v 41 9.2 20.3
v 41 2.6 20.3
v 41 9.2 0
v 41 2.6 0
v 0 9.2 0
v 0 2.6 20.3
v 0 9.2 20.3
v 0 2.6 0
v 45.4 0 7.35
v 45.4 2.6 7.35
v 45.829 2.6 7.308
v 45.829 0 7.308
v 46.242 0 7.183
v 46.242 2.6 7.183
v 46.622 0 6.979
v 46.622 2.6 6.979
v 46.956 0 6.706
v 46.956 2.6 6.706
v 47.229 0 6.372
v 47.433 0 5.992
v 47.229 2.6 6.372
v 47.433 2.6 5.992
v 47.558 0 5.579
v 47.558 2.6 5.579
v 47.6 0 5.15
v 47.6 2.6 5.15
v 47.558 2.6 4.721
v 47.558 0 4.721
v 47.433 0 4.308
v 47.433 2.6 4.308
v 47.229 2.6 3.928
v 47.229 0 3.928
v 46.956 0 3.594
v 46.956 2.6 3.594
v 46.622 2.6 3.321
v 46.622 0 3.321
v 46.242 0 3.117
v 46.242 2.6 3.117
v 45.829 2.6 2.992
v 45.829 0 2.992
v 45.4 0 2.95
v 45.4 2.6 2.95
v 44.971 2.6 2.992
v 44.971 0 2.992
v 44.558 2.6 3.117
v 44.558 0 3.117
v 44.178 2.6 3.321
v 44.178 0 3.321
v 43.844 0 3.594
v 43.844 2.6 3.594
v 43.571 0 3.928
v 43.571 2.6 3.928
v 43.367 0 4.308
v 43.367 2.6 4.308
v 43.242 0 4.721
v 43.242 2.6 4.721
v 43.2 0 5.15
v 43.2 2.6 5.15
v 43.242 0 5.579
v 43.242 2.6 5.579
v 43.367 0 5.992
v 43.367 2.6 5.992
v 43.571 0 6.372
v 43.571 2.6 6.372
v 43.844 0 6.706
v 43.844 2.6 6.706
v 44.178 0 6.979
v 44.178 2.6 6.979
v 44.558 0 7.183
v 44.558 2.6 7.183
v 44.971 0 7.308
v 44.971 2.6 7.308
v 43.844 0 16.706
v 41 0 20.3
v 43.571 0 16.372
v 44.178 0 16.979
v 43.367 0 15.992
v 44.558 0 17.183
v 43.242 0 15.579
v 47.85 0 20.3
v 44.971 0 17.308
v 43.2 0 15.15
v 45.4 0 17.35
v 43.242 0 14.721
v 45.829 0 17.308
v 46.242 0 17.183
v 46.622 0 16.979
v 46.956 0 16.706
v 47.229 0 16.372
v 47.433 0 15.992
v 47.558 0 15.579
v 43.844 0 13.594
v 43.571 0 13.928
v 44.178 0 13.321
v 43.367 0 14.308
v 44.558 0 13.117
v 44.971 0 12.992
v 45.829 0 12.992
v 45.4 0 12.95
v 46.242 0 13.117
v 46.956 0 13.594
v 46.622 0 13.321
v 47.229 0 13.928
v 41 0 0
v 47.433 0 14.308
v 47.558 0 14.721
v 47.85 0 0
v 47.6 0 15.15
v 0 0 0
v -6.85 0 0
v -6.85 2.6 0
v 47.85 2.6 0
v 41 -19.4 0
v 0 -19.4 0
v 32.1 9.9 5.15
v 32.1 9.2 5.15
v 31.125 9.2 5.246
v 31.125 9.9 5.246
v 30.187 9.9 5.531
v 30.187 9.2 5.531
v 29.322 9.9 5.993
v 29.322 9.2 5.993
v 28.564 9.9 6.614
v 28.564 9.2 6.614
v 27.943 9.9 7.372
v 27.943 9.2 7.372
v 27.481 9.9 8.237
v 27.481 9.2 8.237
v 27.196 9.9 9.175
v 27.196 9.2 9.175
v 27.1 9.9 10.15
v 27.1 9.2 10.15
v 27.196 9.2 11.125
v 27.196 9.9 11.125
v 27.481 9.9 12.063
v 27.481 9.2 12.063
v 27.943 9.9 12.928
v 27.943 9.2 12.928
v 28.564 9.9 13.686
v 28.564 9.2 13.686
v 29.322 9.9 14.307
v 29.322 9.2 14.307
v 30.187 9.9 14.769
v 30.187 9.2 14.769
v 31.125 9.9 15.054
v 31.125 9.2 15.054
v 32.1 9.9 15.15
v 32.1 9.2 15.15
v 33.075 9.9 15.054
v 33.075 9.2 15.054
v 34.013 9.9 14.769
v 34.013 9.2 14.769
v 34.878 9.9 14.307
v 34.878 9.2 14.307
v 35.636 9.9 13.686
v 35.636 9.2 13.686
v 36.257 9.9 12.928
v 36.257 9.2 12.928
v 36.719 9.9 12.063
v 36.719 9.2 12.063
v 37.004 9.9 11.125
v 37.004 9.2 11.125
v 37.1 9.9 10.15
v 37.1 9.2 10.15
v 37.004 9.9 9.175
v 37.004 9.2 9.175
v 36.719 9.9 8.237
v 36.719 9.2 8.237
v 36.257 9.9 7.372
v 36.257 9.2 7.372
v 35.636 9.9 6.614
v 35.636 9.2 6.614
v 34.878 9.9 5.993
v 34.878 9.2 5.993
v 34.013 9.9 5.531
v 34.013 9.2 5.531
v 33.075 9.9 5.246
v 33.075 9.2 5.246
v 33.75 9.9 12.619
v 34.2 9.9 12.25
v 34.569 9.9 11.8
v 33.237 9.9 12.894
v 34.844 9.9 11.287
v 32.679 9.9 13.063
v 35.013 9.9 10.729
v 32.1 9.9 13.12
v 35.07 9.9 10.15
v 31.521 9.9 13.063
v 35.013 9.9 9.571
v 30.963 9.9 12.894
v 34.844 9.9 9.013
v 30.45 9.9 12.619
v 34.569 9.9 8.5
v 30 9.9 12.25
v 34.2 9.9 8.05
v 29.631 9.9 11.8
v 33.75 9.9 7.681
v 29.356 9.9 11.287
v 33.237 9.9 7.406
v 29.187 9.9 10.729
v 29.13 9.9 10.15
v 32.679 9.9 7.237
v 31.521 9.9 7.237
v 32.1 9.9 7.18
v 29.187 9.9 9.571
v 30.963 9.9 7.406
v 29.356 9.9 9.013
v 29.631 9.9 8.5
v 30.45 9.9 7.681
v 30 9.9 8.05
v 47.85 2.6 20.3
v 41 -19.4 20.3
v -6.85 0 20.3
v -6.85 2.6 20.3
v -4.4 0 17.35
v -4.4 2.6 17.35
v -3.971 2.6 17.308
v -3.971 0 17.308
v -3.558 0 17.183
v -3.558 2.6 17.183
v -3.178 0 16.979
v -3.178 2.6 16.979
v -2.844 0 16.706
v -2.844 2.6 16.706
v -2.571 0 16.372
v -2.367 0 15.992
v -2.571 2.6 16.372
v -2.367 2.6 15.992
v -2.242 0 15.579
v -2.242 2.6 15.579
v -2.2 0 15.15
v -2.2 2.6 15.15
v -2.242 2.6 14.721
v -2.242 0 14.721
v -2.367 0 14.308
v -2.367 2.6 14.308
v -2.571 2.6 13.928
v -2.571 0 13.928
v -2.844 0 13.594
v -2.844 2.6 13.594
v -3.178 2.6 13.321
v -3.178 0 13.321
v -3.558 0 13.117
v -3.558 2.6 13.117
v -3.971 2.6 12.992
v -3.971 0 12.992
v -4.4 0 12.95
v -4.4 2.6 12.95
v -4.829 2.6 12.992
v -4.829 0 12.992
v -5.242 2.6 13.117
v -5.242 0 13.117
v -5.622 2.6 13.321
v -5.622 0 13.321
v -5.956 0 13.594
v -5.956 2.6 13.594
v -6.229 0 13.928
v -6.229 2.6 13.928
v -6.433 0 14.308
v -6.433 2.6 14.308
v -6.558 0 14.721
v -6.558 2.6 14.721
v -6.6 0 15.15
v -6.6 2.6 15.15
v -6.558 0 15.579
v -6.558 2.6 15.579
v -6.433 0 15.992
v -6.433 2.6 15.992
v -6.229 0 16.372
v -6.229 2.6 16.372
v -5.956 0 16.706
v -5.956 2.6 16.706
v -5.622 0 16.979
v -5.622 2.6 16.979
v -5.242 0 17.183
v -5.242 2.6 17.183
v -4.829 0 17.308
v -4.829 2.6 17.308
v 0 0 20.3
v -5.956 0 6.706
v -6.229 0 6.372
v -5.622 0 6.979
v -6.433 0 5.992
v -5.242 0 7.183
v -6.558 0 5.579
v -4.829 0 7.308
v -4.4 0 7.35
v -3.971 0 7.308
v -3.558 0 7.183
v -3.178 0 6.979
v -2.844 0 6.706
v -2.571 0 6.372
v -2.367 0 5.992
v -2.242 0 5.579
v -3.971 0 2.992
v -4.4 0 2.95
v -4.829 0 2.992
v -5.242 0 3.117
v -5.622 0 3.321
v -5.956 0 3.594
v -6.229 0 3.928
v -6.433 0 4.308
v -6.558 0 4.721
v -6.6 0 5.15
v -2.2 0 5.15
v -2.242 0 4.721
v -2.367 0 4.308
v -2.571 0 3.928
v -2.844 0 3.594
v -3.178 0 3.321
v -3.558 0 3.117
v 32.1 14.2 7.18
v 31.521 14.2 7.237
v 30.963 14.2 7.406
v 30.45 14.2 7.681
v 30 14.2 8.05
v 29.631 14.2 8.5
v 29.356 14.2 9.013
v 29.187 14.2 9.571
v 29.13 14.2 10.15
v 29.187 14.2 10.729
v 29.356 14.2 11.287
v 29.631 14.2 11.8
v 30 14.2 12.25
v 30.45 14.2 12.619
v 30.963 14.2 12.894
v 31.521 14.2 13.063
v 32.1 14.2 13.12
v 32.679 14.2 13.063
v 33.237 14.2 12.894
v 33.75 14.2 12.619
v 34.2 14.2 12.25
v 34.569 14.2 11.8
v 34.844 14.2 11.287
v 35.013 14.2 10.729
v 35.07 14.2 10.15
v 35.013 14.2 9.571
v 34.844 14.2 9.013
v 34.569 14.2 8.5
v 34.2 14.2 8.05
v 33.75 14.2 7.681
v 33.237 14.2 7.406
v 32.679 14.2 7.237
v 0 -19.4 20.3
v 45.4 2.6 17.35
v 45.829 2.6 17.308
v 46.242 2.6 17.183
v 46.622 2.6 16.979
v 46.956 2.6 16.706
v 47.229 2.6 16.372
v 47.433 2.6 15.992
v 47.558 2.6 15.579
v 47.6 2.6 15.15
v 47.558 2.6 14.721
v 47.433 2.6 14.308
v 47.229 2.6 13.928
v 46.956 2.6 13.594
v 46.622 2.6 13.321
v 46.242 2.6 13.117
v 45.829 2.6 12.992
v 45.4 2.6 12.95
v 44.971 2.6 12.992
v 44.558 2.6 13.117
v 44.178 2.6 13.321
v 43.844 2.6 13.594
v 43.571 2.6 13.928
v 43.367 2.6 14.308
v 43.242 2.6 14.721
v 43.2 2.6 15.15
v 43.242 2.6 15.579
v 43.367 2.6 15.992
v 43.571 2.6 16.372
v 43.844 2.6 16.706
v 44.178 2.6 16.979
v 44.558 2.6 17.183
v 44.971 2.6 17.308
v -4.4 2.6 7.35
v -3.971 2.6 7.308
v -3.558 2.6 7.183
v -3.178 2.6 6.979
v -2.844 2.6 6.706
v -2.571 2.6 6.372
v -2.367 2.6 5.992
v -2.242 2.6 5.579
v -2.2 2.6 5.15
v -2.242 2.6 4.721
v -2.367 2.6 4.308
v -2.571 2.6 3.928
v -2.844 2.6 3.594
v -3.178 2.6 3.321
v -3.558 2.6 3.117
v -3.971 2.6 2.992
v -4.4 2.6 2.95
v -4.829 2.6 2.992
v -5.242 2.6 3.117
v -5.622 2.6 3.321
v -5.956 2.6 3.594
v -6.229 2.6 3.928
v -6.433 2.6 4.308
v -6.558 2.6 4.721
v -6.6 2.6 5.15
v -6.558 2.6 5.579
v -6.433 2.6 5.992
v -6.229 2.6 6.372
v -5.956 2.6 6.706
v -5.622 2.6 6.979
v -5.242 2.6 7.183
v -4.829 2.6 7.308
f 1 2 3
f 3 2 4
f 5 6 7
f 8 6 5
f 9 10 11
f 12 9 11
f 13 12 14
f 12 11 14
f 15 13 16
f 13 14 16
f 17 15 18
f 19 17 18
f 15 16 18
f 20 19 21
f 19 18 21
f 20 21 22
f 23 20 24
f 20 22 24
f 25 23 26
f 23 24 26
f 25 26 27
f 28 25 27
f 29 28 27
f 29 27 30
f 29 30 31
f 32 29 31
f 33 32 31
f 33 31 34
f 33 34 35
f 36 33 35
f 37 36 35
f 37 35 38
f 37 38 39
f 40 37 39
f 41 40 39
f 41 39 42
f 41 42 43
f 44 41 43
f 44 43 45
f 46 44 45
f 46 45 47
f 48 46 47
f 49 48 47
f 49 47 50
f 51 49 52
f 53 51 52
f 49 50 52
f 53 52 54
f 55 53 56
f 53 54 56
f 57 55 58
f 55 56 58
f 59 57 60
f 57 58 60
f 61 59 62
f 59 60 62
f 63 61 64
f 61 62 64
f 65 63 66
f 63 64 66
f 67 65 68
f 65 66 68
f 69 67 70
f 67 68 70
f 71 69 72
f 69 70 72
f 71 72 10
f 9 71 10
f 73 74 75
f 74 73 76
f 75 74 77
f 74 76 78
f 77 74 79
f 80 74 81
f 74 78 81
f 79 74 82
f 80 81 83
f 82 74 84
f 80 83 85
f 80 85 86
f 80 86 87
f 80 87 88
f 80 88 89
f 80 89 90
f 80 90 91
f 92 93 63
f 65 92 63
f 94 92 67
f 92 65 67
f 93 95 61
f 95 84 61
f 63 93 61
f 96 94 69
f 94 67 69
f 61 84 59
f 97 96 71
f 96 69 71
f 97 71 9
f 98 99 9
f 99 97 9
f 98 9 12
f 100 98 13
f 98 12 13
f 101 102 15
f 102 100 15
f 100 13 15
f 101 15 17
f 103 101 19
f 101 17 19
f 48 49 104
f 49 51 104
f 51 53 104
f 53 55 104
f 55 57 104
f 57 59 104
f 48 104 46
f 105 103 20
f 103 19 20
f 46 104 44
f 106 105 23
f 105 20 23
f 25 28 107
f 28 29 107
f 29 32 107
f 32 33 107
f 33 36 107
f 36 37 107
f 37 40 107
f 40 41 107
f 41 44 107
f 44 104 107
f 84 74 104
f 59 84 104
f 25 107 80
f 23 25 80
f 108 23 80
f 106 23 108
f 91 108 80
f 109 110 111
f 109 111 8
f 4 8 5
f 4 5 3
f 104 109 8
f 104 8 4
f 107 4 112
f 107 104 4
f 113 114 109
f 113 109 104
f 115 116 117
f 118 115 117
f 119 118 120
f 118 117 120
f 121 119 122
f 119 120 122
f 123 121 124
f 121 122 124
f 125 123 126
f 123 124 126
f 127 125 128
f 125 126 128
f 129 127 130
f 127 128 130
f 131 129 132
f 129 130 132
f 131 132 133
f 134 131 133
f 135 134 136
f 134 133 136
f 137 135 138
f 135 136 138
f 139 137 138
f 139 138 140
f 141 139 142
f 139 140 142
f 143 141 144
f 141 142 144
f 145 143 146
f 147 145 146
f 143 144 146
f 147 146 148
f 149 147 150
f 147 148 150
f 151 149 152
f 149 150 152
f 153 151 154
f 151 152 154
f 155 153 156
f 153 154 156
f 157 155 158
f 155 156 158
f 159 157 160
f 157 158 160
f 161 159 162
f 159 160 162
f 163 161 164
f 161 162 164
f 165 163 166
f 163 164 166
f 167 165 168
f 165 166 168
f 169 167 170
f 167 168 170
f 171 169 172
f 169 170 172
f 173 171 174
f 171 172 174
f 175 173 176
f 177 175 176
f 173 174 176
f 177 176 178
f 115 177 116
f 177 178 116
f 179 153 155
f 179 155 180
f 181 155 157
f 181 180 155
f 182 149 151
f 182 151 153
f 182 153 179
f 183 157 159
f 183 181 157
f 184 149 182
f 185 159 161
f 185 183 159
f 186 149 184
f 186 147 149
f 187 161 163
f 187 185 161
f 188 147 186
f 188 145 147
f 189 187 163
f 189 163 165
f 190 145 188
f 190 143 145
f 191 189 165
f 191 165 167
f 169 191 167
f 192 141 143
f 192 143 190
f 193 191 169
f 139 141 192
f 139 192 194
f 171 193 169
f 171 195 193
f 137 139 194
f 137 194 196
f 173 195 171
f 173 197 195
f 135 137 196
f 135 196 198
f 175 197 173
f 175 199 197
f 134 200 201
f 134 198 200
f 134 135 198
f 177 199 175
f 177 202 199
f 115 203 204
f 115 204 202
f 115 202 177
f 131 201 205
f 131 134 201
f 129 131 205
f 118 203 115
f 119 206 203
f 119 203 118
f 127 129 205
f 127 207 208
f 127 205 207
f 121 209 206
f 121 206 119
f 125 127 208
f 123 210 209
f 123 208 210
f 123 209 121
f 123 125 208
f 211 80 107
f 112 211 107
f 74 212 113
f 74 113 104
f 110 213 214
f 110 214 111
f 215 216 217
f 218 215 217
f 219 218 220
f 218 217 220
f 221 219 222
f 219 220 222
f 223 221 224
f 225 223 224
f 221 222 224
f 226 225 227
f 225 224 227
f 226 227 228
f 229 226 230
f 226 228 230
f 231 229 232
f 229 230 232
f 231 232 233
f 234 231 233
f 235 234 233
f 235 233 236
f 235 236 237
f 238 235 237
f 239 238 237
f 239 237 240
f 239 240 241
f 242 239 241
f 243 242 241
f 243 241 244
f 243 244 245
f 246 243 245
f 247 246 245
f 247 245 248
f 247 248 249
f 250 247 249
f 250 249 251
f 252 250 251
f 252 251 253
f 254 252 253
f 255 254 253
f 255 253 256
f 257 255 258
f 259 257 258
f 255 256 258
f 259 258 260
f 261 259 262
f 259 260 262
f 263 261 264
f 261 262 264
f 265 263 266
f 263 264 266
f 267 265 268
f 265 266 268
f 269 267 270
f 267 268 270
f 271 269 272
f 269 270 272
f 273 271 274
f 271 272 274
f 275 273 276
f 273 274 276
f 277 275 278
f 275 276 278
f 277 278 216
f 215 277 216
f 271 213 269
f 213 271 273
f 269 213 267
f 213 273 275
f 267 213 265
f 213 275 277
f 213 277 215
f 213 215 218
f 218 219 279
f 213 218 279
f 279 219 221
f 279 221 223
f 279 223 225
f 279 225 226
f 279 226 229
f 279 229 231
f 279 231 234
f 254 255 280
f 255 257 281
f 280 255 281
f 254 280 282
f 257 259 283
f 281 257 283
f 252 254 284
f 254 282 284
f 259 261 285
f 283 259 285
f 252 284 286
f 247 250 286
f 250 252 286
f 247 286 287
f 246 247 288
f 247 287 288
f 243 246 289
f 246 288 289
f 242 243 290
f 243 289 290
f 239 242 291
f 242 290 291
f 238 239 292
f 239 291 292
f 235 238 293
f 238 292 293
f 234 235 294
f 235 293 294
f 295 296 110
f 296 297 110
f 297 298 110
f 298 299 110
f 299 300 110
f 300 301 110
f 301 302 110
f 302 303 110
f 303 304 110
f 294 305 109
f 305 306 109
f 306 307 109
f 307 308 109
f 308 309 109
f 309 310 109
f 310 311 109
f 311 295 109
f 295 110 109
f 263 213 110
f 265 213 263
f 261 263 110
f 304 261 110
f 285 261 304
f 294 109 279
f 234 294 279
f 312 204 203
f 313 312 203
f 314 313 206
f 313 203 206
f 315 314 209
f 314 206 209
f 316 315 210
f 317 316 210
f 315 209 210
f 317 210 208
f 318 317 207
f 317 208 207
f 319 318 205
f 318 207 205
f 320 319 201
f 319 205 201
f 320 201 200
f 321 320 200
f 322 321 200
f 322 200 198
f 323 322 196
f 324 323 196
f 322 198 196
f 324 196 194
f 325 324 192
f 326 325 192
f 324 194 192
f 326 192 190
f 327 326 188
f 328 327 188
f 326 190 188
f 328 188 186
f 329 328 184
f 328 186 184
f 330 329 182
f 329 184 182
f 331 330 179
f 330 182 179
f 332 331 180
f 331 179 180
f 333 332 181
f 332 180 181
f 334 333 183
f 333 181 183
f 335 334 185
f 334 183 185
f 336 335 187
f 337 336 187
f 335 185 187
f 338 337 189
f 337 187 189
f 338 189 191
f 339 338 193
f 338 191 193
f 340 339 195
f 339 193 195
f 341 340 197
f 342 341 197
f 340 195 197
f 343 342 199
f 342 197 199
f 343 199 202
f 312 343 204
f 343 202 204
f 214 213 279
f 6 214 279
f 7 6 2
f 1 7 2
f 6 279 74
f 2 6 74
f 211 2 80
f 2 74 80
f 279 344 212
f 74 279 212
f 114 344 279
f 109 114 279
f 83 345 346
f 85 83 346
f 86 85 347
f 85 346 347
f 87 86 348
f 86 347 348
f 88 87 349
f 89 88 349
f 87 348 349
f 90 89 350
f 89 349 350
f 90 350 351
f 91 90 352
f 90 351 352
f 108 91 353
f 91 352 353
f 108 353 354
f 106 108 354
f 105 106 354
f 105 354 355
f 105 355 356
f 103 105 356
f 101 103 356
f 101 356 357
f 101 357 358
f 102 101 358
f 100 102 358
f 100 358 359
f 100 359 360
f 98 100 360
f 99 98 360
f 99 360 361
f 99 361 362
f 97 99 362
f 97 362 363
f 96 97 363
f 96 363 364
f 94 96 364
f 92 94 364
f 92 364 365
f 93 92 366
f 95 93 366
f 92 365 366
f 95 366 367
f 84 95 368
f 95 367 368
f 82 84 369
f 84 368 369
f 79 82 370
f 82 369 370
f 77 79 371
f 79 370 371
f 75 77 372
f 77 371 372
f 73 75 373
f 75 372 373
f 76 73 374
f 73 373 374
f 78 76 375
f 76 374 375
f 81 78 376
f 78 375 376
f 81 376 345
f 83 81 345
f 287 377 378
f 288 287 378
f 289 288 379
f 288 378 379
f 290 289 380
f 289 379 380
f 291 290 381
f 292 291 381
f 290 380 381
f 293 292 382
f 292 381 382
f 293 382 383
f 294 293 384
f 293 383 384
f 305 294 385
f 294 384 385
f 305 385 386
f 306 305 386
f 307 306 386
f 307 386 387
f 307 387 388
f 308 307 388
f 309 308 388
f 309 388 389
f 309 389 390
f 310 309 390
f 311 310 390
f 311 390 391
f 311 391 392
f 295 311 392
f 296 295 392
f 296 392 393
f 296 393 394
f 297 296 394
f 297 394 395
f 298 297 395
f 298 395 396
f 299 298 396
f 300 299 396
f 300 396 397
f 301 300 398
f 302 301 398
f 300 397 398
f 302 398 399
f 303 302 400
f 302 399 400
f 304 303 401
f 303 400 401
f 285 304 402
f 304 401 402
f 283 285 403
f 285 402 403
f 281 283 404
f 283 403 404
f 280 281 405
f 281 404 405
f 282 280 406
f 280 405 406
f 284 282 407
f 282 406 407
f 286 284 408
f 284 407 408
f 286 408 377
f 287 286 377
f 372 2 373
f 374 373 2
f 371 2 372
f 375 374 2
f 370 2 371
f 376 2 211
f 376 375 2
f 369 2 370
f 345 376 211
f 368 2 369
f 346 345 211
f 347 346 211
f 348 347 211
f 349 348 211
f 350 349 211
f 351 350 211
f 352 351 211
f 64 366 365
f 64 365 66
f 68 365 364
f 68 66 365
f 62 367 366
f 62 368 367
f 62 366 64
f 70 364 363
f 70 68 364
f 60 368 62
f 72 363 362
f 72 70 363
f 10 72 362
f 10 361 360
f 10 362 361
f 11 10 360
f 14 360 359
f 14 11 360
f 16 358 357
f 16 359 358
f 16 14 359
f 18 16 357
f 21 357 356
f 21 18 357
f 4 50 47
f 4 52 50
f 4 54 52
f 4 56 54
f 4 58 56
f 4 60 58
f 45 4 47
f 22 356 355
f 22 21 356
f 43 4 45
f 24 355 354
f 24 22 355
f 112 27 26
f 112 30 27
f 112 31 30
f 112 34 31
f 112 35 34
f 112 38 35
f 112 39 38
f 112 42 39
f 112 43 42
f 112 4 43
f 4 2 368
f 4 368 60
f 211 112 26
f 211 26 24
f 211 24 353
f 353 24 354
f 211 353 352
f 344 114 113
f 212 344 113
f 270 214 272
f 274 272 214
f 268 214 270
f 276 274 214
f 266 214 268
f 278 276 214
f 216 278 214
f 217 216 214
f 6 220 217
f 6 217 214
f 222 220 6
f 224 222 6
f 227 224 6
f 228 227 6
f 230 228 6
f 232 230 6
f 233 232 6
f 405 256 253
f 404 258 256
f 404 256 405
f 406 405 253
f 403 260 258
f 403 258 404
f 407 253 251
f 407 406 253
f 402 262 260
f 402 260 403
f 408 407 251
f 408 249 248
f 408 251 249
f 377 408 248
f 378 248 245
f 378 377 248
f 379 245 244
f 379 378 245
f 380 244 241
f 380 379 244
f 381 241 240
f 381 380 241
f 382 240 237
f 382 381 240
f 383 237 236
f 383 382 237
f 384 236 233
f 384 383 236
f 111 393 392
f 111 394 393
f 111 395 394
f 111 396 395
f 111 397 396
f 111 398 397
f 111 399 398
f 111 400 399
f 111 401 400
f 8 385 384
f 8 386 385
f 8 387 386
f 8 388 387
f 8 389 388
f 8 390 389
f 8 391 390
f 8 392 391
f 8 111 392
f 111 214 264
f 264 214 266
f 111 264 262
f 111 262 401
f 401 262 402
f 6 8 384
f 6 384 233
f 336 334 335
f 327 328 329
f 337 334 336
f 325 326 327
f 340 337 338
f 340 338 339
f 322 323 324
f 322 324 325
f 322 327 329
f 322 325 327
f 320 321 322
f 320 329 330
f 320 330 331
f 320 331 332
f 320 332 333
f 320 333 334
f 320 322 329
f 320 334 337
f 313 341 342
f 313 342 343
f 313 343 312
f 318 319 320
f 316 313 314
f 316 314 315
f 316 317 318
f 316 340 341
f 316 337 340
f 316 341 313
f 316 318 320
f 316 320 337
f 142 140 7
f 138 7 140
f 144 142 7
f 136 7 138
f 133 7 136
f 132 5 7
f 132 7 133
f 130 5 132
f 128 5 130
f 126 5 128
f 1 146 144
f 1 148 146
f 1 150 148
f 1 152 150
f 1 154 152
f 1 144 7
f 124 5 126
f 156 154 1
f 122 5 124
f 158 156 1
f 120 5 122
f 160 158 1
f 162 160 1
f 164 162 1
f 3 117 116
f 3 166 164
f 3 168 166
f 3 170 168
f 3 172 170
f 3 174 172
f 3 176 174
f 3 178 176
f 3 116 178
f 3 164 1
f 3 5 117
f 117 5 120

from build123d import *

# Parameters (mm, degrees)
SKETCH1_W           = 41
SKETCH1_H           = 19.4
BOSS_EXTRUDE1_DEPTH = 20.3
SKETCH2_W           = 54.7
SKETCH2_H           = 20.3
BOSS_EXTRUDE2_DEPTH = 2.6
SKETCH3_W           = 41
SKETCH3_H           = 20.3
BOSS_EXTRUDE3_DEPTH = 6.6
SKETCH4_R           = 2.2
CUT_EXTRUDE1_DEPTH  = 57.442116367
SKETCH5_R           = 5
BOSS_EXTRUDE4_DEPTH = 0.7
SKETCH6_R           = 2.97
BOSS_EXTRUDE5_DEPTH = 4.3


with BuildPart() as part:
    # Sketch1 → Boss-Extrude1 (new body)
    with BuildSketch(Plane.XY):
        with Locations((20.5, -9.7)):
            Rectangle(SKETCH1_W, SKETCH1_H)
    extrude(amount=BOSS_EXTRUDE1_DEPTH)

    # Sketch2 → Boss-Extrude2 (add)
    with BuildSketch(Plane(origin=(0, 0, 0), x_dir=(1, 0, 0), z_dir=(0, 1, 0))):
        with Locations((20.5, -10.15)):
            Rectangle(SKETCH2_W, SKETCH2_H)
    extrude(amount=BOSS_EXTRUDE2_DEPTH)

    # Sketch3 → Boss-Extrude3 (add)
    with BuildSketch(Plane(origin=(0, 2.6, 0), x_dir=(1, 0, 0), z_dir=(0, 1, 0))):
        with Locations((20.5, -10.15)):
            Rectangle(SKETCH3_W, SKETCH3_H)
    extrude(amount=BOSS_EXTRUDE3_DEPTH)

    # Sketch4 → Cut-Extrude1 (cut, through all)
    with BuildSketch(Plane(origin=(0, 2.6, 0), x_dir=(1, 0, 0), z_dir=(0, 1, 0))):
        with Locations(Location((-4.4, -15.15, 0), (0, 0, 270))):
            Circle(SKETCH4_R)
        with Locations(Location((-4.4, -5.15, 0), (0, 0, 270))):
            Circle(SKETCH4_R)
        with Locations(Location((45.4, -15.15, 0), (0, 0, 270))):
            Circle(SKETCH4_R)
        with Locations(Location((45.4, -5.15, 0), (0, 0, 270))):
            Circle(SKETCH4_R)
    extrude(amount=-CUT_EXTRUDE1_DEPTH, mode=Mode.SUBTRACT)

    # Sketch5 → Boss-Extrude4 (add)
    with BuildSketch(Plane(origin=(0, 9.2, 0), x_dir=(1, 0, 0), z_dir=(0, 1, 0))):
        with Locations(Location((32.1, -10.15, 0), (0, 0, 90))):
            Circle(SKETCH5_R)
    extrude(amount=BOSS_EXTRUDE4_DEPTH)

    # Sketch6 → Boss-Extrude5 (add)
    with BuildSketch(Plane(origin=(0, 9.9, 0), x_dir=(1, 0, 0), z_dir=(0, 1, 0))):
        with Locations(Location((32.1, -10.15, 0), (0, 0, 90))):
            Circle(SKETCH6_R)
    extrude(amount=BOSS_EXTRUDE5_DEPTH)


solid = part.part
